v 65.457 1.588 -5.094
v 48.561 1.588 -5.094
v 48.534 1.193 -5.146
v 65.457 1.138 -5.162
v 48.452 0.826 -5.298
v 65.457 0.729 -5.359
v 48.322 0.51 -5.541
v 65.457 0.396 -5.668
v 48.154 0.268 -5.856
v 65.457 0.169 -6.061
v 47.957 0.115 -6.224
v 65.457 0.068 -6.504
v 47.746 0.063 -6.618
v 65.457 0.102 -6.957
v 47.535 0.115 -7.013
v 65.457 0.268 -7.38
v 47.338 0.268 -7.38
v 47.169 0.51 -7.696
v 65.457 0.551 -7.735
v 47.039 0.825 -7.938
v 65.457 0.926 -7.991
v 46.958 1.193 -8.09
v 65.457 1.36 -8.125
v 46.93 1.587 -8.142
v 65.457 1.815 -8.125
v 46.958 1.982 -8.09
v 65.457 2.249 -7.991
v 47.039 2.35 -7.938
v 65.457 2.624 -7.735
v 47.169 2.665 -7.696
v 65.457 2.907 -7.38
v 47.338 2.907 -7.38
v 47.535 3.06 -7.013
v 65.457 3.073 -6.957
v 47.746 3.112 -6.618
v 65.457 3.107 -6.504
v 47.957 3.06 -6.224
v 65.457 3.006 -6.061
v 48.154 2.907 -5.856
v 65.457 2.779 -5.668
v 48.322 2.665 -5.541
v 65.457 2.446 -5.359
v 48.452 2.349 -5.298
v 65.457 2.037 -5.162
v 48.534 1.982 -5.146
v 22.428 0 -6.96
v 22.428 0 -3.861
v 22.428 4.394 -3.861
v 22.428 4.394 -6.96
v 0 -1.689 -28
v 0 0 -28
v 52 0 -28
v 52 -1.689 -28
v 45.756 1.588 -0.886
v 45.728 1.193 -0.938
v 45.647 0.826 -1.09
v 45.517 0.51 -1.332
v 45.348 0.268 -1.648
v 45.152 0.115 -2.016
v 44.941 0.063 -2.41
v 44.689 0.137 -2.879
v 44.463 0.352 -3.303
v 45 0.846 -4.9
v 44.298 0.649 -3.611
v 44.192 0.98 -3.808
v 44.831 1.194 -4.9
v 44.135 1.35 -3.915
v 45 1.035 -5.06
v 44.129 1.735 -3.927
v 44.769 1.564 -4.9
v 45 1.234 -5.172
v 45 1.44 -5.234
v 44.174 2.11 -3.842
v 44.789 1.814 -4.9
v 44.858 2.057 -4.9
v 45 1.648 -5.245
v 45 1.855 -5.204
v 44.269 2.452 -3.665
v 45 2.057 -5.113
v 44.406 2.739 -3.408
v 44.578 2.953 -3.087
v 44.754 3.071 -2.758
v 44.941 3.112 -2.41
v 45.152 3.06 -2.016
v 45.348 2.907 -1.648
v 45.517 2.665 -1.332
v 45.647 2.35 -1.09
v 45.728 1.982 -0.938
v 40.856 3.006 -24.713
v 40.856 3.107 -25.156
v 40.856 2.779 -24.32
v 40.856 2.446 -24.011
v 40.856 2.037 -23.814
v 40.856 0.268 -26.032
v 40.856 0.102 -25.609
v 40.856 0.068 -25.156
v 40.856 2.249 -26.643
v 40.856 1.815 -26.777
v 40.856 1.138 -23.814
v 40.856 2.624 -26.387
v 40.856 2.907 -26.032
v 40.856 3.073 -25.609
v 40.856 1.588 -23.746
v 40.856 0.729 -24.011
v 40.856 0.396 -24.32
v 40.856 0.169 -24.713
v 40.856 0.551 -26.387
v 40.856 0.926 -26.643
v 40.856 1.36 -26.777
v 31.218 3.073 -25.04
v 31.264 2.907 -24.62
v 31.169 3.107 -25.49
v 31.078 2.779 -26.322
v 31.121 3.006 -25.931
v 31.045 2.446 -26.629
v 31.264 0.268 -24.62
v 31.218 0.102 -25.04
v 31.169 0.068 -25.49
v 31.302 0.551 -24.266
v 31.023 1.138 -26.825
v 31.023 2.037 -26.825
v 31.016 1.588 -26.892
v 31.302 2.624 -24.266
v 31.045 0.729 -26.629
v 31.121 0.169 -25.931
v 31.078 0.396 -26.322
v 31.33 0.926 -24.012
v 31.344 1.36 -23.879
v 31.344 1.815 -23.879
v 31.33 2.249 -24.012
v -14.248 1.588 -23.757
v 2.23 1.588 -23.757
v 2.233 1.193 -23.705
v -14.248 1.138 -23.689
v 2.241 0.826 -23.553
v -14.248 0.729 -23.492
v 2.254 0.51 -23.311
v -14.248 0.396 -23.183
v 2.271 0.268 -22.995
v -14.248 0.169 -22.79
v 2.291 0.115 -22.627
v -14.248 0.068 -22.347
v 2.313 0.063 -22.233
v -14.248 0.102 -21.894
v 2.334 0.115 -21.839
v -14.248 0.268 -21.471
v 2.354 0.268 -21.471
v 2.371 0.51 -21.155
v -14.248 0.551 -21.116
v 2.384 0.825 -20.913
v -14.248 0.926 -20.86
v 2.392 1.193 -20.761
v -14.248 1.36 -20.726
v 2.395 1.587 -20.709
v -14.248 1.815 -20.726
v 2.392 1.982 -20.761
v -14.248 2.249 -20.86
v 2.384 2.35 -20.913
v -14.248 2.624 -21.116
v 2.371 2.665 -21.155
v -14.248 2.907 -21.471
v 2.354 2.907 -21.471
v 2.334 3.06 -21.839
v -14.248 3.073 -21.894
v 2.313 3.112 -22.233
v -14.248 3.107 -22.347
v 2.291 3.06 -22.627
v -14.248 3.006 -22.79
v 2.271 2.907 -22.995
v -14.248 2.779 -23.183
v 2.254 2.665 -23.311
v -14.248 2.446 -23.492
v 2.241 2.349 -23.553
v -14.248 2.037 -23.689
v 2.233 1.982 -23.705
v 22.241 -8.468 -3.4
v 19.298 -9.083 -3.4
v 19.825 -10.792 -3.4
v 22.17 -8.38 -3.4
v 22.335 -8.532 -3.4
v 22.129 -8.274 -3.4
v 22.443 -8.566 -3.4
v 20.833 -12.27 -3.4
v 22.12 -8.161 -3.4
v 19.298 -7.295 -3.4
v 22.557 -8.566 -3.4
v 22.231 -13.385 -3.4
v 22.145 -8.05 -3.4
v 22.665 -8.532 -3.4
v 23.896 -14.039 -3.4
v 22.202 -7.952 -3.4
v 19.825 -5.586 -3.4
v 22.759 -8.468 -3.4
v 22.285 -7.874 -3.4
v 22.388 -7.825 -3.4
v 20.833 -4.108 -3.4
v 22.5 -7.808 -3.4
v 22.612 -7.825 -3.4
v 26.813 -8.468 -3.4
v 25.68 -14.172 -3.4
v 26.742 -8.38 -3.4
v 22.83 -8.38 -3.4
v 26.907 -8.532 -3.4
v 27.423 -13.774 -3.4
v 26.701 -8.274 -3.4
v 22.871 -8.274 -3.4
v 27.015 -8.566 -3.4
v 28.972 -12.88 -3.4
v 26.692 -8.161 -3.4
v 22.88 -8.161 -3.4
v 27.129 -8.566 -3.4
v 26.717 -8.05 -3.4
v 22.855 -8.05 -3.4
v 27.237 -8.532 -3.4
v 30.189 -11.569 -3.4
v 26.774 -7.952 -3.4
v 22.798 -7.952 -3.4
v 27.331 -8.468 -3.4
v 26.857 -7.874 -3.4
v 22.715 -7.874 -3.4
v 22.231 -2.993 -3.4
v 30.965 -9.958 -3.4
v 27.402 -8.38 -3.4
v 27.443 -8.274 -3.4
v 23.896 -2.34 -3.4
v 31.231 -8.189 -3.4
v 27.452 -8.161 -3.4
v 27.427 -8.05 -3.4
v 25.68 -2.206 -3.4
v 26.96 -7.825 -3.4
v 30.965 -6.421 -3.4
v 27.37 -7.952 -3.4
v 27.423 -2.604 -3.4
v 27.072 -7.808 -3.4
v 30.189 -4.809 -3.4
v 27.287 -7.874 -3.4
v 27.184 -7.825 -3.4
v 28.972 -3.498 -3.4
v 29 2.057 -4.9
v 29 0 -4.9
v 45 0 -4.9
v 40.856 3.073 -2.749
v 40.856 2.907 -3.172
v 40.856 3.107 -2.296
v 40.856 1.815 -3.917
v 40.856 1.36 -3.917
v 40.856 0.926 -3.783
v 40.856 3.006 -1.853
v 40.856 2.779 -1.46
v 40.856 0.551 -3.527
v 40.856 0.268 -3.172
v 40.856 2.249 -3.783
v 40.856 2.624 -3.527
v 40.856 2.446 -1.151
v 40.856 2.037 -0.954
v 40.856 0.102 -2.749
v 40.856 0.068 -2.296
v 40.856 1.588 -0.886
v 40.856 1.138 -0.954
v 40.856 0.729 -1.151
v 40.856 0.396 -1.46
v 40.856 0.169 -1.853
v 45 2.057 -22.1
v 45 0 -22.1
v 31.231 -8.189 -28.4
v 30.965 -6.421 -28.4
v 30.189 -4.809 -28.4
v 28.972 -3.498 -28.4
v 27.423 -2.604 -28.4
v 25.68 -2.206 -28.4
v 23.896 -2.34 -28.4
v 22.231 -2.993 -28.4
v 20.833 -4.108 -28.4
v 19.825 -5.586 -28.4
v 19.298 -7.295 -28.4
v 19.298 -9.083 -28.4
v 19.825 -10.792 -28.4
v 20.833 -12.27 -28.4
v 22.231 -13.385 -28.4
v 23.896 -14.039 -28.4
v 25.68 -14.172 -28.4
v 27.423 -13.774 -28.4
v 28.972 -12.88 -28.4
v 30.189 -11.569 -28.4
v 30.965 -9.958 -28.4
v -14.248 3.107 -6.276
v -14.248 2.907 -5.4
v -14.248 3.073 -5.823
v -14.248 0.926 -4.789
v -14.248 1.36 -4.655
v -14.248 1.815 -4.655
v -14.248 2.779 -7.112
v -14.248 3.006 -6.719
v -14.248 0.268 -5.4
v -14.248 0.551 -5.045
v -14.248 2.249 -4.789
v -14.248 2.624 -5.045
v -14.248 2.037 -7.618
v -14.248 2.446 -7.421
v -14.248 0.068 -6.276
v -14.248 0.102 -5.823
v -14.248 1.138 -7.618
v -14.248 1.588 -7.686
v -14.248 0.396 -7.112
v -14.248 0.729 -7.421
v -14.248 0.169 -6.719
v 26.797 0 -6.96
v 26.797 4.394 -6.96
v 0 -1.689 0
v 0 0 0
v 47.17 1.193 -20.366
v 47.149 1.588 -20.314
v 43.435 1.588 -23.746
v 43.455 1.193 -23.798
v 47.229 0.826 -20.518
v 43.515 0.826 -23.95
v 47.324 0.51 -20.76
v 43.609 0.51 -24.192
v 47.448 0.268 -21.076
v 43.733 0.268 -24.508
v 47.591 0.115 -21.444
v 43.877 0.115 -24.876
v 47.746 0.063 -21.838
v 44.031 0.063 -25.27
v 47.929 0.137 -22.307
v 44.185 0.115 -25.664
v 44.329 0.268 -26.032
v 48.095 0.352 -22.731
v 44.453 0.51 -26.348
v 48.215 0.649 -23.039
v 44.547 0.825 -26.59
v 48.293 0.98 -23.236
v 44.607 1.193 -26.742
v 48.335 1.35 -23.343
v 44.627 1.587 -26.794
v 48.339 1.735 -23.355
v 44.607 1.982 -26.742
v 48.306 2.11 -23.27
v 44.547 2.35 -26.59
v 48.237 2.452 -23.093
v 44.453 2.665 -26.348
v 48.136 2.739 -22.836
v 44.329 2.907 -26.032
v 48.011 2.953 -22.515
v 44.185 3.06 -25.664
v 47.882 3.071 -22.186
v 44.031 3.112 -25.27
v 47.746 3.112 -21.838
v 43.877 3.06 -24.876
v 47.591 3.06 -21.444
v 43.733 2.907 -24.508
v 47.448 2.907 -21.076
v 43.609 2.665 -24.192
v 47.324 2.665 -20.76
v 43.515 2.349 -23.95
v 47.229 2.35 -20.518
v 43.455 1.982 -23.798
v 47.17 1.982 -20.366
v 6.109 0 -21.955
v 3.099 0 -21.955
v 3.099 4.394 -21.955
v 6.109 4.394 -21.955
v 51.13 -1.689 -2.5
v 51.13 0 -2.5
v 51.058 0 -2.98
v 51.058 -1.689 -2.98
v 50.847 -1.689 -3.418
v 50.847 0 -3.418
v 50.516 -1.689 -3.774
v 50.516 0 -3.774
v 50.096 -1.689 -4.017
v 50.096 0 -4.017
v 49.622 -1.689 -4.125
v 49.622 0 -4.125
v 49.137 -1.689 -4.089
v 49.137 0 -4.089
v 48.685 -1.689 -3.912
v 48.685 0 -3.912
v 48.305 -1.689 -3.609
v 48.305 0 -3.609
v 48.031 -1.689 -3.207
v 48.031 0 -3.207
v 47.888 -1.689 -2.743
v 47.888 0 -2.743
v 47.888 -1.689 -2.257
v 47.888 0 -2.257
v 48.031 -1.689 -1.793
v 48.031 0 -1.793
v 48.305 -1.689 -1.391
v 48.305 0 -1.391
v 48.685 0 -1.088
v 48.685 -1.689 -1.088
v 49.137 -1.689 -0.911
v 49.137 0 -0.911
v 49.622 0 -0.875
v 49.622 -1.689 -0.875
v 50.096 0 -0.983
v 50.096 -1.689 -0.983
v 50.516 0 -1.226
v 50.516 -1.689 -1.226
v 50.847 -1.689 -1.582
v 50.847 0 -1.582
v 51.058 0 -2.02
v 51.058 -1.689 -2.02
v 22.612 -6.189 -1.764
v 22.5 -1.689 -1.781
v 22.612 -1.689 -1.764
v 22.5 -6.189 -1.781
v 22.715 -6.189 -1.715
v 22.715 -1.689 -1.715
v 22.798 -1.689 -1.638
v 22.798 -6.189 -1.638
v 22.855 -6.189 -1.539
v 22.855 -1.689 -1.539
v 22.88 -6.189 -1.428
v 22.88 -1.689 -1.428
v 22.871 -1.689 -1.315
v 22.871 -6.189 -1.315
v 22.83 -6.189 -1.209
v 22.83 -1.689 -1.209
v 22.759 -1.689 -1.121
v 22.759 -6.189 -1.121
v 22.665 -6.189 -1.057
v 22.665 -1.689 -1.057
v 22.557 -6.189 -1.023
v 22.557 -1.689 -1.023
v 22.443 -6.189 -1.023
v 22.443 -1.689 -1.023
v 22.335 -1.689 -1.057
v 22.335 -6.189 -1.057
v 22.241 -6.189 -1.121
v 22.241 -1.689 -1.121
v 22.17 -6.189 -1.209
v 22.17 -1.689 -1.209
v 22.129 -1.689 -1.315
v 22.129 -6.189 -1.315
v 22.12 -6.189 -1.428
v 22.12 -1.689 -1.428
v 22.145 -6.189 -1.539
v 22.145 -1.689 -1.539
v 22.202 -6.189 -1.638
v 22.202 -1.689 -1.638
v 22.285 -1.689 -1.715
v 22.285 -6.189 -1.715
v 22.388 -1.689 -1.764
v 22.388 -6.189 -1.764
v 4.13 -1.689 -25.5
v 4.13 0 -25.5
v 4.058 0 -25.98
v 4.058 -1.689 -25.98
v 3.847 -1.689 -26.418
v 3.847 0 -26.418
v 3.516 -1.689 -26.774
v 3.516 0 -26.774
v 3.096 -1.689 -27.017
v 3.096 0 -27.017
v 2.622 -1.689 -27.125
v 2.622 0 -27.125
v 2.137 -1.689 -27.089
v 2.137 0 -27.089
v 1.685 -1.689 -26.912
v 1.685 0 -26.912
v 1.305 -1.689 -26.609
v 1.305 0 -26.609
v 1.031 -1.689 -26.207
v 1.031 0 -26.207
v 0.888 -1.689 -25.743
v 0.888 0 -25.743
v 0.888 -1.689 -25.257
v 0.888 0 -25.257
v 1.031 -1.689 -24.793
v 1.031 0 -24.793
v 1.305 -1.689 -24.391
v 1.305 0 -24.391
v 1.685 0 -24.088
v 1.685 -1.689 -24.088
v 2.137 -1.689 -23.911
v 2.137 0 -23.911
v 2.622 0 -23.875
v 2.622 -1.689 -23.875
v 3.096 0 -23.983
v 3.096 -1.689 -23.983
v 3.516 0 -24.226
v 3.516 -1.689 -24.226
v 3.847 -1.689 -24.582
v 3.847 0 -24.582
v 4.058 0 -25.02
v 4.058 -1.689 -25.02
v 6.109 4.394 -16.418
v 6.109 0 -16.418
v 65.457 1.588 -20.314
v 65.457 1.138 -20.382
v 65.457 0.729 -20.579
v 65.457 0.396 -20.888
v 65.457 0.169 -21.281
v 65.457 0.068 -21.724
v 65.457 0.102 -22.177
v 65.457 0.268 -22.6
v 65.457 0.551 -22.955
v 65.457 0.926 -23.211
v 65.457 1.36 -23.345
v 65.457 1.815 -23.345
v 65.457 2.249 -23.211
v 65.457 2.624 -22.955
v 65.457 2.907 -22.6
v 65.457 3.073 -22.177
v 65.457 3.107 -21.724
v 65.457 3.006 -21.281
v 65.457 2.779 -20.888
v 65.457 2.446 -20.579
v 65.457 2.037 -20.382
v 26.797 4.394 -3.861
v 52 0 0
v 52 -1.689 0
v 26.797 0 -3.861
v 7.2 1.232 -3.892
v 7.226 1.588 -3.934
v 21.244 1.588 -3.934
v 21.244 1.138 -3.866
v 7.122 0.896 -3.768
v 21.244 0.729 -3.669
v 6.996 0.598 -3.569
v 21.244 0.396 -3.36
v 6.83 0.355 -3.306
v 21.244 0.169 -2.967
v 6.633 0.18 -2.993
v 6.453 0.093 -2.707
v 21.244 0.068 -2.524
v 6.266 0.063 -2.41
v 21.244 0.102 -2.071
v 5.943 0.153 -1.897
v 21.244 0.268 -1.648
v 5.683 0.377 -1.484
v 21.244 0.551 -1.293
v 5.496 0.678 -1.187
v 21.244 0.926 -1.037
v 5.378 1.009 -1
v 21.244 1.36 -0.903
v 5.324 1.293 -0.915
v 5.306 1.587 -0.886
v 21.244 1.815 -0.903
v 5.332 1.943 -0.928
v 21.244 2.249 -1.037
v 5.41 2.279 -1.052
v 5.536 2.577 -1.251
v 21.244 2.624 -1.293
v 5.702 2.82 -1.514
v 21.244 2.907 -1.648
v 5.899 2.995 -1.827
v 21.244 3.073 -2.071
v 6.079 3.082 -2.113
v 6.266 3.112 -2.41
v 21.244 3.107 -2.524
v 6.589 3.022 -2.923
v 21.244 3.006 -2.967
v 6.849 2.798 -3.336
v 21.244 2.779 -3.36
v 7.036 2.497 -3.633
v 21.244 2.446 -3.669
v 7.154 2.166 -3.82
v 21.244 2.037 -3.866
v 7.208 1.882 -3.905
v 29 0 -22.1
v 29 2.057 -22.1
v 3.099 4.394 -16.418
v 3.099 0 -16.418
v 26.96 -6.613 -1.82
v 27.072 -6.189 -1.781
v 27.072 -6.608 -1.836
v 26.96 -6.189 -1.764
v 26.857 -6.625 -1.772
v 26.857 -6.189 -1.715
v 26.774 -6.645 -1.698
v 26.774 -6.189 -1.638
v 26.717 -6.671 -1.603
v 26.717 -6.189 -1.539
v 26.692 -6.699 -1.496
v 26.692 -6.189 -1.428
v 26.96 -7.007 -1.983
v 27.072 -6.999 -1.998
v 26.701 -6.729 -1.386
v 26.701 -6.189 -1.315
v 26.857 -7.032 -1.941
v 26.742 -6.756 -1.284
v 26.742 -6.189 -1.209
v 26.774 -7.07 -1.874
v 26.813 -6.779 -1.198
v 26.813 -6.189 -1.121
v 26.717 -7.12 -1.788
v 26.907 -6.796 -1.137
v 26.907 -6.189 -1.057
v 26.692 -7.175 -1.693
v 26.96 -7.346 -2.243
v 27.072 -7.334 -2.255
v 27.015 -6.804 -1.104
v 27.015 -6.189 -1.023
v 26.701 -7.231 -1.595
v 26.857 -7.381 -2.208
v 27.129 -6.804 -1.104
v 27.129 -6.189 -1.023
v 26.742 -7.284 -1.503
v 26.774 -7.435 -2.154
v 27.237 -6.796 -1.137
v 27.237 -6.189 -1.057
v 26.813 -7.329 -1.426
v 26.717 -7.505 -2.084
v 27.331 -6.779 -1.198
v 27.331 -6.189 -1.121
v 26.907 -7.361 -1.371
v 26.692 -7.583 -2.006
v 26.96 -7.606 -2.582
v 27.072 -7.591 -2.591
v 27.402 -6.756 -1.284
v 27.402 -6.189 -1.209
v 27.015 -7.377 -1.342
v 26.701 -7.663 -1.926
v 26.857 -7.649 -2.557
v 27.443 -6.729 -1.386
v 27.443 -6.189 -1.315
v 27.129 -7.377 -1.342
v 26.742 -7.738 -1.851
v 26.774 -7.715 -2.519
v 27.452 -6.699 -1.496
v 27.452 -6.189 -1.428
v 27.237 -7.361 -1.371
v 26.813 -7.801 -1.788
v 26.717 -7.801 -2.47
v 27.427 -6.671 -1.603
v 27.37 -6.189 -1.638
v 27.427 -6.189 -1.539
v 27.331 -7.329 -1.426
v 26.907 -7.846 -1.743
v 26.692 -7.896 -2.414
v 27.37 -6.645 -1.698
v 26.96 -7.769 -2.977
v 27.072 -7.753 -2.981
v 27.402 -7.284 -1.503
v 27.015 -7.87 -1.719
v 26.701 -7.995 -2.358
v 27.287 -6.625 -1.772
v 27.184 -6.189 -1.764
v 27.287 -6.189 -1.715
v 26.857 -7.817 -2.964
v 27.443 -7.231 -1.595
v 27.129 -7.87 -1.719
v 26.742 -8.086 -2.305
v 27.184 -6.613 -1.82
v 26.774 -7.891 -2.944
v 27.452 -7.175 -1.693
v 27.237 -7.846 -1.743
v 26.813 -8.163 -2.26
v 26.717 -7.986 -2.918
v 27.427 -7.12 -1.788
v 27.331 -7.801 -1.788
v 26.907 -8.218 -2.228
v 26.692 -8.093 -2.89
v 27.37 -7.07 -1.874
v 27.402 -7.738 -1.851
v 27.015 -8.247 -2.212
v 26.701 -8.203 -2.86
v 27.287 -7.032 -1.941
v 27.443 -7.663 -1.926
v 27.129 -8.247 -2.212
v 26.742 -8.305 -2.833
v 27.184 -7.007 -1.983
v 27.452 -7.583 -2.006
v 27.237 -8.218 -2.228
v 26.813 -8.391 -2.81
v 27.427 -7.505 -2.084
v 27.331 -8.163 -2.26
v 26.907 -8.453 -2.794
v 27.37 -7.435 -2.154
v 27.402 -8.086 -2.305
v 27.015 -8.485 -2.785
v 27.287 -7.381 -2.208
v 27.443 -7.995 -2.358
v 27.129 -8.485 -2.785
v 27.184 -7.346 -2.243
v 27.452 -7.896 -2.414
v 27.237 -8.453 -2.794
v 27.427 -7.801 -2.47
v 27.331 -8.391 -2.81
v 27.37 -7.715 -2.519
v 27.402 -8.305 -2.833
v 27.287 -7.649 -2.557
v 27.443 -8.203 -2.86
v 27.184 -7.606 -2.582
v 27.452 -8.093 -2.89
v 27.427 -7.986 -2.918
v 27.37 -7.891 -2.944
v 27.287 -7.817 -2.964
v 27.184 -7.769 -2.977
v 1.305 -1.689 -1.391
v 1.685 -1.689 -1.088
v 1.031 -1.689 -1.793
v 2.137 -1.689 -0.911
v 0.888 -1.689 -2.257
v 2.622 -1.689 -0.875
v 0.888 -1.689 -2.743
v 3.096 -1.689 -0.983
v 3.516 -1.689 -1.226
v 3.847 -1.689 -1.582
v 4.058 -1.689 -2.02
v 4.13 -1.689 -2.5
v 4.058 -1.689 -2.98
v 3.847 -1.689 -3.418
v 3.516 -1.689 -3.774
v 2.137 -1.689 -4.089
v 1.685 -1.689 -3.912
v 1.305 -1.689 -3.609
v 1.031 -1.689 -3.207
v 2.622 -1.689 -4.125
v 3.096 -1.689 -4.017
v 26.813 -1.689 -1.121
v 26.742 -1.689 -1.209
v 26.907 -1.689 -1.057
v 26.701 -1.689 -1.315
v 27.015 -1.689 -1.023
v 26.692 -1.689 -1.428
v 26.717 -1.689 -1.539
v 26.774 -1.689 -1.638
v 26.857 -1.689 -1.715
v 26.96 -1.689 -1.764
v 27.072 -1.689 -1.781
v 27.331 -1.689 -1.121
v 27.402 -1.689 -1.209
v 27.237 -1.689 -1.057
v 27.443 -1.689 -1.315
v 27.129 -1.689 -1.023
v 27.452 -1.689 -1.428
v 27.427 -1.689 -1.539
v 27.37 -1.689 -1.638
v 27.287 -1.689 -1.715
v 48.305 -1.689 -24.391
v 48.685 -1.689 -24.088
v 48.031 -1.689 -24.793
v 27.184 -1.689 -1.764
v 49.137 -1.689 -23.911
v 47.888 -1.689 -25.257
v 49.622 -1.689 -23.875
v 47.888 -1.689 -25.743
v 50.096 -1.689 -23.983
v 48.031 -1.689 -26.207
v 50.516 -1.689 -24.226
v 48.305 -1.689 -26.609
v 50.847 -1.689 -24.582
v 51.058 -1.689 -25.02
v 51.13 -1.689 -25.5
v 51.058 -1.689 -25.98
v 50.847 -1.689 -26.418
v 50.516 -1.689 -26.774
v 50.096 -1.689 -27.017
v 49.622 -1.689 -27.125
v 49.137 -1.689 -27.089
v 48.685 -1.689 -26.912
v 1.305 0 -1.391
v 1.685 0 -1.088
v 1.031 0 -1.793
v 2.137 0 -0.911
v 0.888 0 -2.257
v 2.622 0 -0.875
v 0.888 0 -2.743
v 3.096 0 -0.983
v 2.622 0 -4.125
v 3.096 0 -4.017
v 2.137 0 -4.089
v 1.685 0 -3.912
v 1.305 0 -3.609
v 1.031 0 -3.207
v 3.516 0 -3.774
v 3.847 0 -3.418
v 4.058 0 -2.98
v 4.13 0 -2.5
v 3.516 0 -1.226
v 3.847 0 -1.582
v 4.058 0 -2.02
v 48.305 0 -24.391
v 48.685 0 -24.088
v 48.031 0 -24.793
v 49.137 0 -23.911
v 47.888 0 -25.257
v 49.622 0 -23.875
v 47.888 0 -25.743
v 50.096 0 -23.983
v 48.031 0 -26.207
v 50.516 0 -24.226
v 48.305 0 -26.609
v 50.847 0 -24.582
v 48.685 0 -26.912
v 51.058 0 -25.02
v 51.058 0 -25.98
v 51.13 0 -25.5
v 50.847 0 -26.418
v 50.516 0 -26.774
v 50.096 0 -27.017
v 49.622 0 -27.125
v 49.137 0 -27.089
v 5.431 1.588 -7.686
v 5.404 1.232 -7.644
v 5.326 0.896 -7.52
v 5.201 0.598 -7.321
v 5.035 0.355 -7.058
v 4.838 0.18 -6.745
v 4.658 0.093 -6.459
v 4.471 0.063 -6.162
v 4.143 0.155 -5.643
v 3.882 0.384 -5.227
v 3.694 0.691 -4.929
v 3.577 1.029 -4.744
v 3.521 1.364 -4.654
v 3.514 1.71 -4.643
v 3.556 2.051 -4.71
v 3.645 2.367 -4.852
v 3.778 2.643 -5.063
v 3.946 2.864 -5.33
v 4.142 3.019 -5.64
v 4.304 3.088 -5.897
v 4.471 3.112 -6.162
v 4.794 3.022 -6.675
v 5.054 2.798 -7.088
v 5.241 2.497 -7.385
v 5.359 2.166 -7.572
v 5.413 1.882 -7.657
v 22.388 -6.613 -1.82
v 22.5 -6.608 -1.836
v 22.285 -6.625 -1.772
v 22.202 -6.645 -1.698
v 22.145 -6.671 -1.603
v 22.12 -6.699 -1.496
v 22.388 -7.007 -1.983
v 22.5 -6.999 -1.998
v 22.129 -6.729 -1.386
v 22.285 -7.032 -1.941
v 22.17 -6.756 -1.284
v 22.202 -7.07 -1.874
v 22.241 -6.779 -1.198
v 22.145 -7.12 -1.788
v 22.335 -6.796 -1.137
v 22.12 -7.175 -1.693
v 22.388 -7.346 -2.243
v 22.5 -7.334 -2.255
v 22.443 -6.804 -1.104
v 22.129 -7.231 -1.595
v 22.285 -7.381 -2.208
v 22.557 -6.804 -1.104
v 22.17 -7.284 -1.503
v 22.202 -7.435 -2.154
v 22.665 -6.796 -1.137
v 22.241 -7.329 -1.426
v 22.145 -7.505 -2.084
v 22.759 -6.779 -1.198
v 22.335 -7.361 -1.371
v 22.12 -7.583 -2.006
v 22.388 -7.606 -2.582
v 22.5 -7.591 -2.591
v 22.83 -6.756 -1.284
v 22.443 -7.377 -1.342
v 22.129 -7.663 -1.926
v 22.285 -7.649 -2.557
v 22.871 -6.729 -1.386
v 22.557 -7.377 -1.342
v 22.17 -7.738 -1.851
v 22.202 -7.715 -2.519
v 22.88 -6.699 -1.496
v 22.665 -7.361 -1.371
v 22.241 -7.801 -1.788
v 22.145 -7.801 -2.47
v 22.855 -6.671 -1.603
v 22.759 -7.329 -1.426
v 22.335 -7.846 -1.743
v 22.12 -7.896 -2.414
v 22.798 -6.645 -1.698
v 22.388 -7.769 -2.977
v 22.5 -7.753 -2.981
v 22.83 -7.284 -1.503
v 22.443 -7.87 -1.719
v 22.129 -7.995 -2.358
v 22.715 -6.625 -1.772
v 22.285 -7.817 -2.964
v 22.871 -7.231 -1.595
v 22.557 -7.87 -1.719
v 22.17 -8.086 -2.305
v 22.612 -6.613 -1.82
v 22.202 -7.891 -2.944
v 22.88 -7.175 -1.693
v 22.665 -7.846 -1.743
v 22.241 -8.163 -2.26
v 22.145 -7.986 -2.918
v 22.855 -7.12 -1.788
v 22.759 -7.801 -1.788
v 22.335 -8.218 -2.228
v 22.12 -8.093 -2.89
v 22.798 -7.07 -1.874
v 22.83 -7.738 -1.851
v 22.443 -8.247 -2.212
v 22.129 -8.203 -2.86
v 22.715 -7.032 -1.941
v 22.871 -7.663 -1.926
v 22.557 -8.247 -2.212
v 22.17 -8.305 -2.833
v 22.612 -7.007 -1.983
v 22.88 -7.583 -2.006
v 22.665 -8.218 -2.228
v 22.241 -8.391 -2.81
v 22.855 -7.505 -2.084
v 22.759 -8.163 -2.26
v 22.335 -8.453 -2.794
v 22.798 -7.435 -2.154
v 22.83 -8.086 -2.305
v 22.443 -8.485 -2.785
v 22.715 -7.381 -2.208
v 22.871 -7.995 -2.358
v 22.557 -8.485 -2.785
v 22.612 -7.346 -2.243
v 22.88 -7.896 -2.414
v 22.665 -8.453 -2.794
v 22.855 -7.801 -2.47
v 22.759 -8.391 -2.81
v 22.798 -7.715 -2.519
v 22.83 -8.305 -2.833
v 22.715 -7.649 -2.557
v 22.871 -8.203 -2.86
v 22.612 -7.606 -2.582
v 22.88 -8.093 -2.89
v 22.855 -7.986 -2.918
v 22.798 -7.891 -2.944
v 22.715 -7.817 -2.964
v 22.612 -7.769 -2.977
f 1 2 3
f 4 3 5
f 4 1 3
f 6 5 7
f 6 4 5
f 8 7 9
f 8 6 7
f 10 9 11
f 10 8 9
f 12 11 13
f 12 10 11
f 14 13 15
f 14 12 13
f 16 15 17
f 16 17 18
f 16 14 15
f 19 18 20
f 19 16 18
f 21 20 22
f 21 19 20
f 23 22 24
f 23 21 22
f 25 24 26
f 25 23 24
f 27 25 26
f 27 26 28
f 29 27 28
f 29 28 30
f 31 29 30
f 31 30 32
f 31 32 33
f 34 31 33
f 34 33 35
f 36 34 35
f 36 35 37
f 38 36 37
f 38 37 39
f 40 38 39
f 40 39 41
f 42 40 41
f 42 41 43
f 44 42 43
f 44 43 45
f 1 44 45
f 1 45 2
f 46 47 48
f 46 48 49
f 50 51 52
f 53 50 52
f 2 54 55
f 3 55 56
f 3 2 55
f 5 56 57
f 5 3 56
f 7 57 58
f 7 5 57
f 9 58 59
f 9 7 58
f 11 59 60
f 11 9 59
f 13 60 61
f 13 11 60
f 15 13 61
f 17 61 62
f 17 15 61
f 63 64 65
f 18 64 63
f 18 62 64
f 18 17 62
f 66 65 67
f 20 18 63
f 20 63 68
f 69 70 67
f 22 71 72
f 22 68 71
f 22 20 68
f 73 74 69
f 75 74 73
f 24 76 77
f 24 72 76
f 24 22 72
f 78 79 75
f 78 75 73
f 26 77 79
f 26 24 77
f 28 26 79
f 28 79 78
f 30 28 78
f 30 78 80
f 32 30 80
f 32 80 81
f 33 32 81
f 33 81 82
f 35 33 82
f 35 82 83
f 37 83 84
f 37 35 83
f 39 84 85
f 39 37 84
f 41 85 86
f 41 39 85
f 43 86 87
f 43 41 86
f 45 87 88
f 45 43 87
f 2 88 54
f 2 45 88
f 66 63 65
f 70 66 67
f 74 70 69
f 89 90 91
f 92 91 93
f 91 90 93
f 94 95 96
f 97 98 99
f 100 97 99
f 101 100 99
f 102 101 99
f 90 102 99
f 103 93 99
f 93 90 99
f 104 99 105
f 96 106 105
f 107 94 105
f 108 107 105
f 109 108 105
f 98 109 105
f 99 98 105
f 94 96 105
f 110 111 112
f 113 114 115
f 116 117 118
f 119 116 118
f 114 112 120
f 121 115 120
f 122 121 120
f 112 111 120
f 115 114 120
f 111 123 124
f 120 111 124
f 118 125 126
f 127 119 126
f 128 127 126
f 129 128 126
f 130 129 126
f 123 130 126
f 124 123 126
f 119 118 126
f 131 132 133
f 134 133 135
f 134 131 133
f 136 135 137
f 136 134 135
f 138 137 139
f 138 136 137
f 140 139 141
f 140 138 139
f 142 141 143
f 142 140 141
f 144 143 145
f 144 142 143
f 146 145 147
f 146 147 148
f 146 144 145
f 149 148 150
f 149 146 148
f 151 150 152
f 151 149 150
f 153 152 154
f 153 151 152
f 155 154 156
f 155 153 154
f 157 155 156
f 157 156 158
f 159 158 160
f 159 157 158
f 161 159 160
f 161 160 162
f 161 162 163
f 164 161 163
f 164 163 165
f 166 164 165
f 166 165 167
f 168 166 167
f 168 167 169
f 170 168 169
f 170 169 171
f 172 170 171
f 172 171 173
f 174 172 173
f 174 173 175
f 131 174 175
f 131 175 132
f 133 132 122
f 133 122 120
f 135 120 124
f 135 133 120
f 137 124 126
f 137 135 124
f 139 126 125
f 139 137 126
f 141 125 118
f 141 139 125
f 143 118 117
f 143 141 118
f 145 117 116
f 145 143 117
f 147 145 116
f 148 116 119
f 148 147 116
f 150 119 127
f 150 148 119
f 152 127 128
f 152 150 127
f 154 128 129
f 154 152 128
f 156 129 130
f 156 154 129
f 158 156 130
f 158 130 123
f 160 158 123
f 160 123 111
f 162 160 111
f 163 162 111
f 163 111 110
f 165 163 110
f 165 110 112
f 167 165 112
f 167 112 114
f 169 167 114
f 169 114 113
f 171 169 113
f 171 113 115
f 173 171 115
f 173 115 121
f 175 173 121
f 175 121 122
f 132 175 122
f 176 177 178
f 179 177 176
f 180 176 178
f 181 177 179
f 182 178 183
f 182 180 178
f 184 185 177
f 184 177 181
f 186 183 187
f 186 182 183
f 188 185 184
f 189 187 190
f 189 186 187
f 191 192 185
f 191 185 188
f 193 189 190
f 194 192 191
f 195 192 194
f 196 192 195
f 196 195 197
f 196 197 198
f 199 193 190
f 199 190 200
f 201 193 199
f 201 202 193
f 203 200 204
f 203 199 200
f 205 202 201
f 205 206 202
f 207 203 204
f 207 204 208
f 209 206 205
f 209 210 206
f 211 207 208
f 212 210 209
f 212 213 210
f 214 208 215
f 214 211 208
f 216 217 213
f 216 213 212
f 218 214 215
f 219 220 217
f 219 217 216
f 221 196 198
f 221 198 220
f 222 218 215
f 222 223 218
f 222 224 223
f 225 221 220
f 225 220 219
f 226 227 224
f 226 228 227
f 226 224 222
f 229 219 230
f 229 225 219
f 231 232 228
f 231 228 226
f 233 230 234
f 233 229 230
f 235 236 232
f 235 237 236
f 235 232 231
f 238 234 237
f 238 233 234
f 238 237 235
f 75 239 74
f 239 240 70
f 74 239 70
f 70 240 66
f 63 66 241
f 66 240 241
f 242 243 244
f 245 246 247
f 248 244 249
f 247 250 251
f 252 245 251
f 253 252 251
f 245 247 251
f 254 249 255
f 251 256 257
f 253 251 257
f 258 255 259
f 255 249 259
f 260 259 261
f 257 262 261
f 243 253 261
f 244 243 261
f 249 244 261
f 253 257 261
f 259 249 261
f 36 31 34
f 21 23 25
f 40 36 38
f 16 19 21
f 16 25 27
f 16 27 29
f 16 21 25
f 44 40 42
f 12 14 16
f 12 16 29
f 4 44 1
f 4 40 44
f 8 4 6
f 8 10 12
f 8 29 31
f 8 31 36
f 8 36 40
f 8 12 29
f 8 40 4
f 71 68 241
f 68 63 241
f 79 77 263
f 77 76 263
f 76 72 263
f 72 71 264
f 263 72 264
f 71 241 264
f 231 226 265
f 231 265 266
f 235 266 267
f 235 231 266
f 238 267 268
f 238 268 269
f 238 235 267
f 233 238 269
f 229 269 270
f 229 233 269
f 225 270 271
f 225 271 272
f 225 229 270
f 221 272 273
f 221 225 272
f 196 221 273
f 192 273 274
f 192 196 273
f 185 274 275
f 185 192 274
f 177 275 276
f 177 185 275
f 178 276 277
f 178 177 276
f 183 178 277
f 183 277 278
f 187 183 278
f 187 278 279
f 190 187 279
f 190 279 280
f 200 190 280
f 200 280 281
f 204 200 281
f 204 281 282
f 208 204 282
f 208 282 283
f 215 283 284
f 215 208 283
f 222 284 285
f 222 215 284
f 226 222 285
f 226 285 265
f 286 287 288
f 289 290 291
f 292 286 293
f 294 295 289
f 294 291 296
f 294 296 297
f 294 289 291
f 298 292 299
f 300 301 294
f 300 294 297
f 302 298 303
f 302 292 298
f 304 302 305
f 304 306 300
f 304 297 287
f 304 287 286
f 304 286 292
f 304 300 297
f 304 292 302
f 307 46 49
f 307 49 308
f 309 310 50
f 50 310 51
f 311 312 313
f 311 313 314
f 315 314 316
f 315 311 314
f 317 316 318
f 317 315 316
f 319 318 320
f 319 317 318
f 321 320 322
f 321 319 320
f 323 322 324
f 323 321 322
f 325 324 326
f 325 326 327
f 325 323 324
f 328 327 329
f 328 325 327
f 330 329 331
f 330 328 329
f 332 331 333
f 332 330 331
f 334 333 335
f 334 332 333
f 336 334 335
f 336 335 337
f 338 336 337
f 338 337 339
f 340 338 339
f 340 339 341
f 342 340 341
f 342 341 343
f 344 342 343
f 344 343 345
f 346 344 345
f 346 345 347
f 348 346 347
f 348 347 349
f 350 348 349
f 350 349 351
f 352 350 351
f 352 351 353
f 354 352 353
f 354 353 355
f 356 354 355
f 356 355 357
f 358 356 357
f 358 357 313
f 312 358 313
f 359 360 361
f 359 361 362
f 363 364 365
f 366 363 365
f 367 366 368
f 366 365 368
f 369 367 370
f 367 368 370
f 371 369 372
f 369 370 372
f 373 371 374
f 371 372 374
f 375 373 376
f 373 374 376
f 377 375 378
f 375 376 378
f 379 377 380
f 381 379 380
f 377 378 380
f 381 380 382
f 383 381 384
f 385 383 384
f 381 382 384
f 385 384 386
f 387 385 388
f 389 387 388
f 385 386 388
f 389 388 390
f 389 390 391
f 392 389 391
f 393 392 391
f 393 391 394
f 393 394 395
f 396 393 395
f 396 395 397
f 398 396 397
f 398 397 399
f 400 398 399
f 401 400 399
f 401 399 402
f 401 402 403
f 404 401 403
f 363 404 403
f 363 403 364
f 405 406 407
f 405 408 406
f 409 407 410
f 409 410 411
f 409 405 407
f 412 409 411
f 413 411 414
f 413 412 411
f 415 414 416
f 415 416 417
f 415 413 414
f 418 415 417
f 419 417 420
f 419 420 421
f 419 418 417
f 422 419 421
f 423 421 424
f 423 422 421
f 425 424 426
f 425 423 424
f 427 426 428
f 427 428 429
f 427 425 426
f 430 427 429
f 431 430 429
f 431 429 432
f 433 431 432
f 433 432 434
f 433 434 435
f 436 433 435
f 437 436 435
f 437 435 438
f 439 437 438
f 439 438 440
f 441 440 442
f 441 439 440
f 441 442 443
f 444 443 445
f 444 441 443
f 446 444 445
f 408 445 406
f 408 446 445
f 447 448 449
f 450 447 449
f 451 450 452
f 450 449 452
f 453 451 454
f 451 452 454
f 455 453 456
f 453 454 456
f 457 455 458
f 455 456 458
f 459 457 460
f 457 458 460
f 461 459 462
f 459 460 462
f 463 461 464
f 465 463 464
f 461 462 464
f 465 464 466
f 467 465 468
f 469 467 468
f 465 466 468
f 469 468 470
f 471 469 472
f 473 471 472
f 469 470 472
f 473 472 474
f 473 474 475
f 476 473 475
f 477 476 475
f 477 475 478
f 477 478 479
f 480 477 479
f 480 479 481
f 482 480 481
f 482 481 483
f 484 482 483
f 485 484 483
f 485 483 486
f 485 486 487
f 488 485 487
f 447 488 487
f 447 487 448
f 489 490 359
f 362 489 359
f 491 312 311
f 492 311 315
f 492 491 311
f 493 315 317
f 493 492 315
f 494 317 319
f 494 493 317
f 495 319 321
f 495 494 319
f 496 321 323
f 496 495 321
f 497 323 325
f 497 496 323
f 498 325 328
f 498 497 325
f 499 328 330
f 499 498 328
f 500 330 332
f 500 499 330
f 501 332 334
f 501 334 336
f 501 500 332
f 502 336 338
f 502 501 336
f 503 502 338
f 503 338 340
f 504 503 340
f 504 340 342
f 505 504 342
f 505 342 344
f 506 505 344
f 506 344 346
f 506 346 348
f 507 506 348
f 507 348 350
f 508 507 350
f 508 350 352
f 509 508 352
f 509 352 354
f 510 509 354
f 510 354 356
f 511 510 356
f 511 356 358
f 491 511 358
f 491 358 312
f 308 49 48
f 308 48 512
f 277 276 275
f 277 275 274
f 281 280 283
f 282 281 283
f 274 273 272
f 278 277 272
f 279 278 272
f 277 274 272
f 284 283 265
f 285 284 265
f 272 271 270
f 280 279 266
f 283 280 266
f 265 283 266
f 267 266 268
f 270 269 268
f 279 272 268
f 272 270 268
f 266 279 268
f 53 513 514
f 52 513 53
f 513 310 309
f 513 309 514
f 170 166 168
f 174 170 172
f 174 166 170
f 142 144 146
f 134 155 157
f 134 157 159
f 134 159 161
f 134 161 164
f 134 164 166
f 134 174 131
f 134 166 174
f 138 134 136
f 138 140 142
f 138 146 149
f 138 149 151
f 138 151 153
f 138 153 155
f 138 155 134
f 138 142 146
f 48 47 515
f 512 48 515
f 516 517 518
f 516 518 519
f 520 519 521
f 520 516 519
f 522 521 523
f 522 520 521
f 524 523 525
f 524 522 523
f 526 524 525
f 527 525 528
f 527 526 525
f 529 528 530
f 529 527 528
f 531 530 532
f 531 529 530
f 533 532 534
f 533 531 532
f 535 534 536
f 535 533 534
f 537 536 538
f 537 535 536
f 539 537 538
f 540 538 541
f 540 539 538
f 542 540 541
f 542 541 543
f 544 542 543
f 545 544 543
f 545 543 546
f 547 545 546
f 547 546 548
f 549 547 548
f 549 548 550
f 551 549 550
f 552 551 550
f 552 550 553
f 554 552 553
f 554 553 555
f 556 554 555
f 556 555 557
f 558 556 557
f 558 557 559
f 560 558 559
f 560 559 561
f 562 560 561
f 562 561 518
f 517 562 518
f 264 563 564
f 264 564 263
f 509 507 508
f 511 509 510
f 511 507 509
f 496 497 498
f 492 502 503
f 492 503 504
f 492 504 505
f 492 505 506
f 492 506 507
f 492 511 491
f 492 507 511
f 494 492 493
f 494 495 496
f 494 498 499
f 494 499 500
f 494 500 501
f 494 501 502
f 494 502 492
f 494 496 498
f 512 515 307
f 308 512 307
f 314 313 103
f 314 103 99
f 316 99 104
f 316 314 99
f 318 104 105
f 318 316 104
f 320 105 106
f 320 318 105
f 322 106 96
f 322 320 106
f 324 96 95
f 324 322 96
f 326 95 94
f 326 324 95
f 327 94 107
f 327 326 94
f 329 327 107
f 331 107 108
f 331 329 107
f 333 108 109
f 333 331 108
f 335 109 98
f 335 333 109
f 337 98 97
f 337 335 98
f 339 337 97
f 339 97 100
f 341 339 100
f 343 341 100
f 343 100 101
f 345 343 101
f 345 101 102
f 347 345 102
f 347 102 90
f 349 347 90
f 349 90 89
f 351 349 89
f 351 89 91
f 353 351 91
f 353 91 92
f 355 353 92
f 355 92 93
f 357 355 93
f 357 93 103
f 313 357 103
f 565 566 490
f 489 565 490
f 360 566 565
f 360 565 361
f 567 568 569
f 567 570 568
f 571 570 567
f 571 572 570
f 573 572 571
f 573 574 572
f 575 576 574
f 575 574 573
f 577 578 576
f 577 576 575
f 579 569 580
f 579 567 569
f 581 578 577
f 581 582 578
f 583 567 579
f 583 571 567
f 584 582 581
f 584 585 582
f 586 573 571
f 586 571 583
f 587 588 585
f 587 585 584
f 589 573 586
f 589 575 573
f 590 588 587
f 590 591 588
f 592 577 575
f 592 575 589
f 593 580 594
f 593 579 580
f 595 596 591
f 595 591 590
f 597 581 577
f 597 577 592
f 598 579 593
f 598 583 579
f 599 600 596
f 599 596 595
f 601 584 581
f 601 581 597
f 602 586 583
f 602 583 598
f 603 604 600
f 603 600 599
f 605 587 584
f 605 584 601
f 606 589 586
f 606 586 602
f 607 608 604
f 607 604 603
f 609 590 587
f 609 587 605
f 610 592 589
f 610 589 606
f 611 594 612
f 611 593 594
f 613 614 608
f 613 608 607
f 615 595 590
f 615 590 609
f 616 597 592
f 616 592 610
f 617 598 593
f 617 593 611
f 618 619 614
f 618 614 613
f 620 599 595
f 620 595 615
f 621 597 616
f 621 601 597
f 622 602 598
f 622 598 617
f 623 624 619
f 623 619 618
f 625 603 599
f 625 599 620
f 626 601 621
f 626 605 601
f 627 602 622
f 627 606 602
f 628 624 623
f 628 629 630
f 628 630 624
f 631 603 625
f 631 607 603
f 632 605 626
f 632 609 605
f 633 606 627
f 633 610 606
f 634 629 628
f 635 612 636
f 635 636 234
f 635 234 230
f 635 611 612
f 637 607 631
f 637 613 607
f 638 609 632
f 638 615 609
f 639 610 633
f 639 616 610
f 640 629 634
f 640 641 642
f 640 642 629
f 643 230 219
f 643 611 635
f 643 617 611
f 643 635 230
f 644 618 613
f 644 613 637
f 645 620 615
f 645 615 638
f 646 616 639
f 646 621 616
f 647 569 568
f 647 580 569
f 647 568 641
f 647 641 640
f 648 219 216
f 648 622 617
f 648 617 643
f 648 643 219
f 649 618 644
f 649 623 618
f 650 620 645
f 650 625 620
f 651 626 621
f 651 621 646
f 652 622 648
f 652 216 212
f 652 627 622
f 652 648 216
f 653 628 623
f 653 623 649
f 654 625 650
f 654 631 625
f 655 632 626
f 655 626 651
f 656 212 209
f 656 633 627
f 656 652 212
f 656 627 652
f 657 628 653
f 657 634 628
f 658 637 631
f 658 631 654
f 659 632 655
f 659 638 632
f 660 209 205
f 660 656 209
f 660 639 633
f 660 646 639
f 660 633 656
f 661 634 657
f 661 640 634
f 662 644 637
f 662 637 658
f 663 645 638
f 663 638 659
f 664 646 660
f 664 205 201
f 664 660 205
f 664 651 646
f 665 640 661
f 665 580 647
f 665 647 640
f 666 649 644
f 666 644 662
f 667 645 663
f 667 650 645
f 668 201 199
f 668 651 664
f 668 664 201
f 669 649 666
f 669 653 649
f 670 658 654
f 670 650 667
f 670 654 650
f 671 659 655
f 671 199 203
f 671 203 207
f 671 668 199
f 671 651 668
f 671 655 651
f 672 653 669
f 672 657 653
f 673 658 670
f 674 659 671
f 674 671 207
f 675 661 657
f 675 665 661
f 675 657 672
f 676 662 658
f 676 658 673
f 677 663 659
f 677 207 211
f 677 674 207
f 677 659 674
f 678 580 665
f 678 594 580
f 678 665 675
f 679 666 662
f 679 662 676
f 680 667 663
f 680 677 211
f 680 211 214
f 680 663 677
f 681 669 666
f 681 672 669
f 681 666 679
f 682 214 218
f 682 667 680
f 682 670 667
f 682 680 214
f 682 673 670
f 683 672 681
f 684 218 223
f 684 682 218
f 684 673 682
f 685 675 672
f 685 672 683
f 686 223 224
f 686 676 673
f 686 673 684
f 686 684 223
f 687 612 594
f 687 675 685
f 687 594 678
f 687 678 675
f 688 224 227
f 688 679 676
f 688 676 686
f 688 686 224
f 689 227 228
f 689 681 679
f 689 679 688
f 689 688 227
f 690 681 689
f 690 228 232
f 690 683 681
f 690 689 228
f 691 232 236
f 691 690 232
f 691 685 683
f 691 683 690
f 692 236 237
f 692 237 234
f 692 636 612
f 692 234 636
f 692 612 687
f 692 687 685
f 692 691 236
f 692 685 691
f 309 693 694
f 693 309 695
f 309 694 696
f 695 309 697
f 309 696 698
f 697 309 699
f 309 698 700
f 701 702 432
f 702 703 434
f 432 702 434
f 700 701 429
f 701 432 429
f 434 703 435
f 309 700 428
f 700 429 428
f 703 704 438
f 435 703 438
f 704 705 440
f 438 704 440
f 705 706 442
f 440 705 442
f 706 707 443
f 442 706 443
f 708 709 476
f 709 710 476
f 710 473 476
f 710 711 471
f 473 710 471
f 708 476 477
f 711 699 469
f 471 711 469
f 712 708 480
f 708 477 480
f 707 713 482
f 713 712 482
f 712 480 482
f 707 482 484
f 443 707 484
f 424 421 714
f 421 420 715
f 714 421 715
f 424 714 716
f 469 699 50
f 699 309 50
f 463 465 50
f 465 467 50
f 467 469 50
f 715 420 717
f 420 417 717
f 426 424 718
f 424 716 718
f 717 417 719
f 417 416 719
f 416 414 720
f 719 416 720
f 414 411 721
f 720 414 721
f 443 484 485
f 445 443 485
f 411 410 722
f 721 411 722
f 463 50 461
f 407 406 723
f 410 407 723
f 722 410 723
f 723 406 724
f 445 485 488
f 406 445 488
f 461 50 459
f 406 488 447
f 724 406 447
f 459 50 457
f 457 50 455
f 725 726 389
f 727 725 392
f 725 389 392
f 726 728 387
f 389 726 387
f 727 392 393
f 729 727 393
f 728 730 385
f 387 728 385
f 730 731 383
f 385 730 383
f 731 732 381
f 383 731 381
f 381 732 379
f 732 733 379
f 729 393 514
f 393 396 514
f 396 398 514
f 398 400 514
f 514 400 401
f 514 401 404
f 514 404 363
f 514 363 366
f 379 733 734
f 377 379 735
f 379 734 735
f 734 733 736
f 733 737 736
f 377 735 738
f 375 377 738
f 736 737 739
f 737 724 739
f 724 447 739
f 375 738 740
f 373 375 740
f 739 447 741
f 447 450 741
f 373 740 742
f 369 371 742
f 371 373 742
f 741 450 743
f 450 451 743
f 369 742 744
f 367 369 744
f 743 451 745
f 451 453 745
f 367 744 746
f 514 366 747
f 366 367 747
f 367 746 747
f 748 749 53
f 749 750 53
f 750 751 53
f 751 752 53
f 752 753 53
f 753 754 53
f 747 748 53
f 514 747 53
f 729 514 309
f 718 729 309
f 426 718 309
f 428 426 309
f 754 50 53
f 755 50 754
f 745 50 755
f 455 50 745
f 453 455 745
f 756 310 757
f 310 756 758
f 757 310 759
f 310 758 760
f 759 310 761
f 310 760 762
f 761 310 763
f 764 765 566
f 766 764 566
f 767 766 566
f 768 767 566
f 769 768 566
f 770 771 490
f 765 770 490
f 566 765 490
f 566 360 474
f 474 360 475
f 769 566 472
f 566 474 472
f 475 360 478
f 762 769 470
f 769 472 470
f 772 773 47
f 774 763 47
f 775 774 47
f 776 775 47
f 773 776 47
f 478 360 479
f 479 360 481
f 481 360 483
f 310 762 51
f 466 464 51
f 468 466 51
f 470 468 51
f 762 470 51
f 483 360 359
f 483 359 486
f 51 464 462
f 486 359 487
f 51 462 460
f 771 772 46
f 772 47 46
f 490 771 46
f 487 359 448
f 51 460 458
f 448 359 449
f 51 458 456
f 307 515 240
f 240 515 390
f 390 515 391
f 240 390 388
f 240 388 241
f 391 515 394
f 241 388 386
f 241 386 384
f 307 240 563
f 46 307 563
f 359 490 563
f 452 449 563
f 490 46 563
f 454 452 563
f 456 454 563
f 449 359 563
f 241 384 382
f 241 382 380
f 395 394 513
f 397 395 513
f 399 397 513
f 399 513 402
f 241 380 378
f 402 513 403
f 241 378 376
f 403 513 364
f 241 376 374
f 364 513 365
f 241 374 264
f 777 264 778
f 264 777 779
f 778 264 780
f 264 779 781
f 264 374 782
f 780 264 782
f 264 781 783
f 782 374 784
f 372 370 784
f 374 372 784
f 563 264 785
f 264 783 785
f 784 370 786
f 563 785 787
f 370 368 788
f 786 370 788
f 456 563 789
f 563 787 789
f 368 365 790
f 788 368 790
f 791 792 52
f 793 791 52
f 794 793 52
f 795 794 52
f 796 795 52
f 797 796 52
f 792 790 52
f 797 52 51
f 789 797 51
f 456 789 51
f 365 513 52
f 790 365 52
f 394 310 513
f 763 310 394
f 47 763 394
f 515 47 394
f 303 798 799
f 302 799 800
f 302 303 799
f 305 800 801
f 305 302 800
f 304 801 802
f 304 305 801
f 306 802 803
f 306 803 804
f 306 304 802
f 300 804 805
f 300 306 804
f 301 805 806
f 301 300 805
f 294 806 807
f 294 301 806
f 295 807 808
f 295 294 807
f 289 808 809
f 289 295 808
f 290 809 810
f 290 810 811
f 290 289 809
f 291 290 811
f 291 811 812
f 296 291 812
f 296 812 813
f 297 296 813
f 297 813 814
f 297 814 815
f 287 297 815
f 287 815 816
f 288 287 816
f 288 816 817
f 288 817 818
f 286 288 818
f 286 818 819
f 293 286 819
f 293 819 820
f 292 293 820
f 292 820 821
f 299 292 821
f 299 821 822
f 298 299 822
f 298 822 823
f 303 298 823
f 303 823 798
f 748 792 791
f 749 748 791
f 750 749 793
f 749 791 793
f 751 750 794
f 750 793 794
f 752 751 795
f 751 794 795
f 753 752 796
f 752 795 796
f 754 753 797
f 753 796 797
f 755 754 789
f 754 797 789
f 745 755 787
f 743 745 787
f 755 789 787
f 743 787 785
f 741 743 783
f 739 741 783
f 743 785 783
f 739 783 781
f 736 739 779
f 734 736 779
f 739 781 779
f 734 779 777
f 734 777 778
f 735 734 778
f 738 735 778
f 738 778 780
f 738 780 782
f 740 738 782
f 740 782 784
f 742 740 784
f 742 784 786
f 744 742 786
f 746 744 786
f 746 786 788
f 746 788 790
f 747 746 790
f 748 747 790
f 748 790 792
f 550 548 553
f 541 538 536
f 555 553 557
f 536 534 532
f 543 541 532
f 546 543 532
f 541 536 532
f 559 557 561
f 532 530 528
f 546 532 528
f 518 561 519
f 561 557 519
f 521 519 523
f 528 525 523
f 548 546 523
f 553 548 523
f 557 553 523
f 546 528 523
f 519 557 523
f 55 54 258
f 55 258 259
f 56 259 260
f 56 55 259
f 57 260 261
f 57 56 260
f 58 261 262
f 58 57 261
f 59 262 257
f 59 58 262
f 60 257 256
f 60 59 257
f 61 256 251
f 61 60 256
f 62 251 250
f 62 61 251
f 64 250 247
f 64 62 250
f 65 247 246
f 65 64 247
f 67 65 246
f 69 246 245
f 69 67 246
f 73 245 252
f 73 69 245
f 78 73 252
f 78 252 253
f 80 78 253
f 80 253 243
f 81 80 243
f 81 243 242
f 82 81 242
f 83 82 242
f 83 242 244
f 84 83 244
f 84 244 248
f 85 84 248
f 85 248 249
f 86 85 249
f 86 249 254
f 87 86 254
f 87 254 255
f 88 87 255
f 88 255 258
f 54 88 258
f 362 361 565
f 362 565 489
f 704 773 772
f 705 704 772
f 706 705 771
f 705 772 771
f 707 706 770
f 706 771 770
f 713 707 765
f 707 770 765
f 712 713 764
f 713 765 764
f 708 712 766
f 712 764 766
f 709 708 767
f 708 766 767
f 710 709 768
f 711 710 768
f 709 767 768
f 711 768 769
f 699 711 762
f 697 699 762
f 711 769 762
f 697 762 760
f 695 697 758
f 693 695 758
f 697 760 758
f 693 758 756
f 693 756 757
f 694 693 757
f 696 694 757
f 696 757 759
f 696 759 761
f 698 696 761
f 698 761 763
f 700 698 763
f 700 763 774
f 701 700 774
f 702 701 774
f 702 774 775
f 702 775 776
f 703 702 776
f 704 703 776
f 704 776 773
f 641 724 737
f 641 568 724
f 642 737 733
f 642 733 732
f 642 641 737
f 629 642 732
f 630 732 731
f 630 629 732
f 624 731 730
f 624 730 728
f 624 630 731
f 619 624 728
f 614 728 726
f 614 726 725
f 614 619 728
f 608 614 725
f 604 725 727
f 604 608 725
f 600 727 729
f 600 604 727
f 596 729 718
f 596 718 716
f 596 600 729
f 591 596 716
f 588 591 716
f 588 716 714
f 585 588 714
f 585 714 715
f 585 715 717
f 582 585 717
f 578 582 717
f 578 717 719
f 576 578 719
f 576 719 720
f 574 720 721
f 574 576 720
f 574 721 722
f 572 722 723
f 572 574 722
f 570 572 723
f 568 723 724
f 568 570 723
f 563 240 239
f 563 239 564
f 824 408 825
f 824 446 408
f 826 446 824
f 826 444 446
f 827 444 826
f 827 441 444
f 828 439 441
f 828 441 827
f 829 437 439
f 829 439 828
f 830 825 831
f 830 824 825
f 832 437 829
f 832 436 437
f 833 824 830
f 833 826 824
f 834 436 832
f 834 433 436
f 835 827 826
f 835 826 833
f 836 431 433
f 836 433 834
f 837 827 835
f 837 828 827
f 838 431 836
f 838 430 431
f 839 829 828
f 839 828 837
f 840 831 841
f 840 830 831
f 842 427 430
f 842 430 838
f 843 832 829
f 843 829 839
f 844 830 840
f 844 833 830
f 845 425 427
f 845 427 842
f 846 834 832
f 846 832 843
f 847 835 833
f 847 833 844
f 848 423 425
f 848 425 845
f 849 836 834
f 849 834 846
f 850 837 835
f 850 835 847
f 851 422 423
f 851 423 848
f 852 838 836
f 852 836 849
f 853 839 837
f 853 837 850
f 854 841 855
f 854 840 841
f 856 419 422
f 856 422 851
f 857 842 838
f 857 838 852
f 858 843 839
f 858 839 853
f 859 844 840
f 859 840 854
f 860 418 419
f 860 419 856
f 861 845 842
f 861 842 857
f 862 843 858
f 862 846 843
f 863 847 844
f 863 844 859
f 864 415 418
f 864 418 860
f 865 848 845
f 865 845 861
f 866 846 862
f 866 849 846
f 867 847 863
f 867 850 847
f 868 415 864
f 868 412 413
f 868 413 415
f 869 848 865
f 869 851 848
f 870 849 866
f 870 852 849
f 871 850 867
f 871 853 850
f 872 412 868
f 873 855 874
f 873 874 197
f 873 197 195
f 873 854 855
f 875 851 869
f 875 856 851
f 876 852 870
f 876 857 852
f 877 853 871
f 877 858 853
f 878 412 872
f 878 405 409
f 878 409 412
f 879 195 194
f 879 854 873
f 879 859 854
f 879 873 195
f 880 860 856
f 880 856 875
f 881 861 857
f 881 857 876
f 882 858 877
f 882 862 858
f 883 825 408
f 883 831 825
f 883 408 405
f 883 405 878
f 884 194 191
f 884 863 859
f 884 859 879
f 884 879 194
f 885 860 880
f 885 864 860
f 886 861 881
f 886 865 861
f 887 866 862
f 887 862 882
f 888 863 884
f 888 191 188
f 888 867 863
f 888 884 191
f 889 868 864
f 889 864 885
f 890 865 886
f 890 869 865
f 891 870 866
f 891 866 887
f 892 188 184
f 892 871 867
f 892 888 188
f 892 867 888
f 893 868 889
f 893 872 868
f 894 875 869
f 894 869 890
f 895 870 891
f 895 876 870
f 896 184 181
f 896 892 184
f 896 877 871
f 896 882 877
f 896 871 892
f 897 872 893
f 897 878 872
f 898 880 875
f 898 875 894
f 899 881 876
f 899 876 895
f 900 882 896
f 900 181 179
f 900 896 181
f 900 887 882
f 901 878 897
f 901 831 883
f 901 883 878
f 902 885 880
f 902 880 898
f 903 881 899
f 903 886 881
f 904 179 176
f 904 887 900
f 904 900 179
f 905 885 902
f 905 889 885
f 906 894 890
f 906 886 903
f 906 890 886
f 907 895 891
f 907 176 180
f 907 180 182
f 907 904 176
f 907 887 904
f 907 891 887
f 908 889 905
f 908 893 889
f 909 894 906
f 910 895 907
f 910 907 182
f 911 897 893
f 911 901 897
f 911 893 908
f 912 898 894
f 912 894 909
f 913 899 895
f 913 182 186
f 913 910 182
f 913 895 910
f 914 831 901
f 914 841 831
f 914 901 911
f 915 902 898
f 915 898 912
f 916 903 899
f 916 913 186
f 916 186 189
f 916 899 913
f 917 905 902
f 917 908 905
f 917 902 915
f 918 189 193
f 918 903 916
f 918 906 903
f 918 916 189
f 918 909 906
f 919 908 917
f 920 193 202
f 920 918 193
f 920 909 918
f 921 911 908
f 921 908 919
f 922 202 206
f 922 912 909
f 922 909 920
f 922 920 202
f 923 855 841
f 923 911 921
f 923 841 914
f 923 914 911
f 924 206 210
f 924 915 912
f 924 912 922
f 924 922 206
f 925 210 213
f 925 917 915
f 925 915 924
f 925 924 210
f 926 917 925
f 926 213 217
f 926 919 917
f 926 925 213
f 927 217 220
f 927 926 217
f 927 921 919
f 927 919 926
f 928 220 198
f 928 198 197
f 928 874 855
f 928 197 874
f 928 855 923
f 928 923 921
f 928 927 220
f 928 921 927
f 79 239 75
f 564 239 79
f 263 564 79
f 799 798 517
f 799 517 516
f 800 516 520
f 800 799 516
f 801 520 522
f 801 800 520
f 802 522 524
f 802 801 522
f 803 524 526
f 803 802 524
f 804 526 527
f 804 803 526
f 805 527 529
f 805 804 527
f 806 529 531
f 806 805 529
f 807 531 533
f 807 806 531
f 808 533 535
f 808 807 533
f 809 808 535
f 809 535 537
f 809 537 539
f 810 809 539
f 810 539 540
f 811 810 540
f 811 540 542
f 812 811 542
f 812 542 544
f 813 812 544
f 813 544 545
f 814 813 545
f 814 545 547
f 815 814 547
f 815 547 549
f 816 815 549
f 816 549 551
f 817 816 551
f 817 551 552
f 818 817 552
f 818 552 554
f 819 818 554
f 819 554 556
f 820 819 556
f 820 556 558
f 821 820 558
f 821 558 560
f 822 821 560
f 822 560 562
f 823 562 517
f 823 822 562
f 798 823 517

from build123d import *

# Parameters (mm, degrees)
SKETCH1_W             = 52
SKETCH1_H             = 28
BOSS_EXTRUDE1_DEPTH   = 1.6891
SKETCH1_3_R           = 1.63
CUT_EXTRUDE1_DEPTH    = 60.083441494
SKETCH2_R             = 6
BOSS_EXTRUDE2_DEPTH   = 25
SWEEP1_PROFILE_R      = 0.381
LPATTERN1_COUNT       = 2
LPATTERN1_PITCH       = 4.572
SKETCH1_4_W           = 16
SKETCH1_4_H           = 17.2
MOTORCONTROLLER_DEPTH = 2.0574
SKETCH5_W             = 3.0099
SKETCH5_H             = 5.5372
SKETCH5_W_2           = 4.3688
SKETCH5_H_2           = 3.0988
BOSS_EXTRUDE3_DEPTH   = 4.3942
SWEEP2_PROFILE_R      = 1.524
SWEEP3_PROFILE_R      = 1.524
SWEEP4_PROFILE_R      = 1.524
SWEEP6_PROFILE_R      = 1.524


with BuildPart() as part:
    # Sketch1 → Boss-Extrude1 (new body)
    with BuildSketch(Plane(origin=(0, 0, 0), x_dir=(1, 0, 0), z_dir=(0, 1, 0))):
        with Locations((26, 14)):
            Rectangle(SKETCH1_W, SKETCH1_H)
    extrude(amount=-BOSS_EXTRUDE1_DEPTH)

    # Sketch1<3> → Cut-Extrude1 (cut, through all)
    with BuildSketch(Plane(origin=(0, 0, 0), x_dir=(1, 0, 0), z_dir=(0, 1, 0))):
        with Locations((2.5, 25.5)):
            Circle(SKETCH1_3_R)
        with Locations((2.5, 2.5)):
            Circle(SKETCH1_3_R)
        with Locations((49.5, 25.5)):
            Circle(SKETCH1_3_R)
        with Locations((49.5, 2.5)):
            Circle(SKETCH1_3_R)
    extrude(amount=-CUT_EXTRUDE1_DEPTH, mode=Mode.SUBTRACT)



with BuildPart() as body_2:
    # Sketch2 → Boss-Extrude2 (new body)
    with BuildSketch(Plane.XY.offset(-3.4)):
        with Locations((25.2312, -8.1891)):
            Circle(SKETCH2_R)
    extrude(amount=-BOSS_EXTRUDE2_DEPTH)


with BuildPart() as part_1:
    add(part.part)

    add(body_2.part)  # Sweep1 merges body 2
    # Sweep1: sweep along a path in Sketch3
    with BuildLine(Plane.ZY.offset(-22.5)) as sweep1_path:
        Line((-1.4, 0), (-1.4, -6.1891))
        ThreePointArc((-1.4, -6.1891), (-1.985786438, -7.603313562), (-3.4, -8.1891))
    # Sweep1 profile (on start of the path) → Sweep1 (sweep)
    with BuildSketch(Plane(origin=(22.5, 0, -1.4), x_dir=(0, 0, -1), z_dir=(0, -1, 0))):
        Circle(SWEEP1_PROFILE_R)
    sweep1 = sweep(path=sweep1_path.line)

    # LPattern1: Sweep1 ×2
    with Locations(*[(i * LPATTERN1_PITCH, 0, 0) for i in range(1, LPATTERN1_COUNT)]):
        add(sweep1)

    # Sketch1<4> → MotorController (add)
    with BuildSketch(Plane(origin=(0, 0, 0), x_dir=(1, 0, 0), z_dir=(0, 1, 0))):
        with Locations((37, 13.5)):
            Rectangle(SKETCH1_4_W, SKETCH1_4_H)
    extrude(amount=MOTORCONTROLLER_DEPTH)

    # Sketch5 → Boss-Extrude3 (add)
    with BuildSketch(Plane(origin=(0, 0, 0), x_dir=(1, 0, 0), z_dir=(0, 1, 0))):
        with Locations((4.60375, 19.1862)):
            Rectangle(SKETCH5_W, SKETCH5_H)
        with Locations((24.6126, 5.4102)):
            Rectangle(SKETCH5_W_2, SKETCH5_H_2)
    extrude(amount=BOSS_EXTRUDE3_DEPTH)

    # Sweep6: sweep along a path in Sketch4<5>
    with BuildLine(Plane(origin=(0, 1.5875, 0), x_dir=(1, 0, 0), z_dir=(0, 1, 0))) as sweep6_path:
        Line((40.856, 2.41), (44.940520364, 2.41))
        Line((44.940520364, 2.41), (47.745694512, 6.618156047))
        Line((47.745694512, 6.618156047), (65.45681083, 6.618156047))
    # Sweep6 profile (on start of the path) → Sweep6 (sweep)
    with BuildSketch(Plane(origin=(40.856, 1.5875, -2.41), x_dir=(0, 0, 1), z_dir=(1, 0, 0))):
        Circle(SWEEP6_PROFILE_R)
    sweep(path=sweep6_path.line, transition=Transition.RIGHT)


with BuildPart() as body_2_2:
    # Sweep2: sweep along a path in Sketch4
    with BuildLine(Plane(origin=(0, 1.5875, 0), x_dir=(1, 0, 0), z_dir=(0, 1, 0))) as sweep2_path:
        Line((31.18115, 25.3771), (2.312530094, 22.233033549))
        Line((2.312530094, 22.233033549), (-14.247884463, 22.233033549))
    # Sweep2 profile (on start of the path) → Sweep2 (sweep)
    with BuildSketch(Plane(origin=(31.18115, 1.5875, -25.3771), x_dir=(-0.10826926941618294, 0, -0.9941216048854818), z_dir=(-0.9941216048854818, 0, 0.10826926941618294))):
        Circle(SWEEP2_PROFILE_R)
    sweep(path=sweep2_path.line, transition=Transition.RIGHT)


with BuildPart() as body_3:
    # Sweep3: sweep along a path in Sketch4<3>
    with BuildLine(Plane(origin=(0, 1.5875, 0), x_dir=(1, 0, 0), z_dir=(0, 1, 0))) as sweep3_path:
        Line((21.244, 2.41), (6.265999425, 2.41))
        Line((6.265999425, 2.41), (4.470608354, 6.162))
        Line((4.470608354, 6.162), (-14.247884463, 6.162))
    # Sweep3 profile (on start of the path) → Sweep3 (sweep)
    with BuildSketch(Plane(origin=(21.244, 1.5875, -2.41), x_dir=(0, 0, -1), z_dir=(-1, 0, 0))):
        Circle(SWEEP3_PROFILE_R)
    sweep(path=sweep3_path.line, transition=Transition.RIGHT)


with BuildPart() as body_4:
    # Sweep4: sweep along a path in Sketch4<4>
    with BuildLine(Plane(origin=(0, 1.5875, 0), x_dir=(1, 0, 0), z_dir=(0, 1, 0))) as sweep4_path:
        Line((40.856, 25.27), (44.031, 25.27))
        Line((44.031, 25.27), (47.745694512, 21.838))
        Line((47.745694512, 21.838), (65.45681083, 21.838))
    # Sweep4 profile (on start of the path) → Sweep4 (sweep)
    with BuildSketch(Plane(origin=(40.856, 1.5875, -25.27), x_dir=(0, 0, 1), z_dir=(1, 0, 0))):
        Circle(SWEEP4_PROFILE_R)
    sweep(path=sweep4_path.line, transition=Transition.RIGHT)


solid = Compound([part_1.part, body_2_2.part, body_3.part, body_4.part])
